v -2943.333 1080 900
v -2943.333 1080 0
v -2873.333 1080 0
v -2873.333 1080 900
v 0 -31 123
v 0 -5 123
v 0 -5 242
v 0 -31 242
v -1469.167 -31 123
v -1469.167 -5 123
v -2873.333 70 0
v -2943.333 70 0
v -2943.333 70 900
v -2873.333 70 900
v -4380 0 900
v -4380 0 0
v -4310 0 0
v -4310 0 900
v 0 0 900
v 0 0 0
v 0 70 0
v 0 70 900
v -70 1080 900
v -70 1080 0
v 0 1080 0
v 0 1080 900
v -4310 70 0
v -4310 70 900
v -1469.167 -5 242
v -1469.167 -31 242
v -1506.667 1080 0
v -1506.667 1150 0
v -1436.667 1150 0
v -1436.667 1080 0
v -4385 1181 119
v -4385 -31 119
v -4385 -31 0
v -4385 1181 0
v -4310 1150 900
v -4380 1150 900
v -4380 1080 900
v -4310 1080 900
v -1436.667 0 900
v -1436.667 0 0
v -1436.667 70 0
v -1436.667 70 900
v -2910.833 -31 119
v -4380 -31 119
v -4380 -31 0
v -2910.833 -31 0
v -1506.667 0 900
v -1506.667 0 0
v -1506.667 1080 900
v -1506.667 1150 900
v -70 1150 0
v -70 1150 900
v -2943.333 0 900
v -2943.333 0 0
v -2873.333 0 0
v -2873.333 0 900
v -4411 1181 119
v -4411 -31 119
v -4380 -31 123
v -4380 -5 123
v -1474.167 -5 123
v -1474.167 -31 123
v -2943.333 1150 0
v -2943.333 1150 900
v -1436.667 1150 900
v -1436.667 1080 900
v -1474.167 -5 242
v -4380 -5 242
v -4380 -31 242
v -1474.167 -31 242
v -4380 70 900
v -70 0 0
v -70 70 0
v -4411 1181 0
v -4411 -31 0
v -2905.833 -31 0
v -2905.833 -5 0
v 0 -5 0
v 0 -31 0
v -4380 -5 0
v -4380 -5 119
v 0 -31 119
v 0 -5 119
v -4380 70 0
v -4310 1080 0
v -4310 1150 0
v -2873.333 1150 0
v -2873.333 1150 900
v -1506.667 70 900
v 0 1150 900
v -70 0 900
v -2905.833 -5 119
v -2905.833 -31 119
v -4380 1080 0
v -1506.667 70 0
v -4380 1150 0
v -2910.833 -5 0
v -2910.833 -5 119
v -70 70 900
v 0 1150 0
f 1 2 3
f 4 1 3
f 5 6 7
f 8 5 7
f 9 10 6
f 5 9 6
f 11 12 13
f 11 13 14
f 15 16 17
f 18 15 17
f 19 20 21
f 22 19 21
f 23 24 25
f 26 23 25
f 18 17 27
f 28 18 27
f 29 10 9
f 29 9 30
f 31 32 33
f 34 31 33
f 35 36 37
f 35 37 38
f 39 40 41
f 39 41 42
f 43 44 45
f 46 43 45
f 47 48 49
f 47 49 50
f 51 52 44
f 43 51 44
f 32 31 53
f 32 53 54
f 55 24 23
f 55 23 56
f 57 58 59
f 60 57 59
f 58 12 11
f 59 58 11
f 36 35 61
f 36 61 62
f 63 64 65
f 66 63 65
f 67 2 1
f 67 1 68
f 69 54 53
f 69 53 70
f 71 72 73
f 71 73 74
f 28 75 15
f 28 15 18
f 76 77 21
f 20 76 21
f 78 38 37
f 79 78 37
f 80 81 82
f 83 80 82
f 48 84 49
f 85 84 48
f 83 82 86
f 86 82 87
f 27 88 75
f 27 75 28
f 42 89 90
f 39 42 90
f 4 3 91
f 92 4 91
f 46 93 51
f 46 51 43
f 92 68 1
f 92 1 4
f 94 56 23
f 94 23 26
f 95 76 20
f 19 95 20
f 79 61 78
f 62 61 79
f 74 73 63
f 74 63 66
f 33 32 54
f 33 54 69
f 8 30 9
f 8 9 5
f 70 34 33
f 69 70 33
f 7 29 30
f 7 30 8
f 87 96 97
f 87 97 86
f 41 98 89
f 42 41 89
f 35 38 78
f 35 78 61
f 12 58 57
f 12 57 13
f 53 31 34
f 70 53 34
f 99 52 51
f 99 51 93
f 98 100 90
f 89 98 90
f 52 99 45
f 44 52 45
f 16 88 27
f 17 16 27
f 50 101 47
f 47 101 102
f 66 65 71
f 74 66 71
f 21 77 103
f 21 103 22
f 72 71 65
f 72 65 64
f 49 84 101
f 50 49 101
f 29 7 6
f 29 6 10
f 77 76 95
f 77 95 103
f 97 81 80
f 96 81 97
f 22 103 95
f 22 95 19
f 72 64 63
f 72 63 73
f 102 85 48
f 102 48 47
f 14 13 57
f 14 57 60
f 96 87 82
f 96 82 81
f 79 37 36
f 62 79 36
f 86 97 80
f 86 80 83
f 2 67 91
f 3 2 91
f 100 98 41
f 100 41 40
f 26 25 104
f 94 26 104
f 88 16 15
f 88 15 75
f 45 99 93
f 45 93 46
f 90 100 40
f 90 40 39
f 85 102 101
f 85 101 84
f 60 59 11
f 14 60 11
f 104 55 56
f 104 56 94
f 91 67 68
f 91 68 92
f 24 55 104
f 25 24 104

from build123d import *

# Parameters (mm, degrees)
F0_W     = 70
F0_H     = 70
F1_DEPTH = 900
F2_W     = 1469.166667
F2_H     = 119
F2_W_2   = 2905.833333
F3_DEPTH = 31
F4_W     = 4912.537255
F4_H     = 1258.728281
F5_DEPTH = 5
F6_W     = 1212
F6_H     = 119
F7_DEPTH = 31
F8_W     = 1212
F8_H     = 119
F9_DEPTH = 5


with BuildPart() as f1:
    # F0 (on Top) → F1 (new body)
    with BuildSketch(Plane.XY):
        with Locations((-2908.333333, 1115)):
            Rectangle(F0_W, F0_H)
        with Locations((-4345, 1115)):
            Rectangle(F0_W, F0_H)
        with Locations((-2908.333333, 35)):
            Rectangle(F0_W, F0_H)
        with Locations((-4345, 35)):
            Rectangle(F0_W, F0_H)
        with Locations((-35, 35)):
            Rectangle(F0_W, F0_H)
        with Locations((-1471.666667, 35)):
            Rectangle(F0_W, F0_H)
        with Locations((-35, 1115)):
            Rectangle(F0_W, F0_H)
        with Locations((-1471.666667, 1115)):
            Rectangle(F0_W, F0_H)
    extrude(amount=F1_DEPTH)


with BuildPart() as f3:
    # F2 (on face) → F3 (new body)
    with BuildSketch(Plane.XZ):
        with Locations((-3645.416667, 59.5)):
            Rectangle(F2_W, F2_H)
        with Locations((-2927.083333, 182.5)):
            Rectangle(F2_W_2, F2_H)
        with Locations((-1452.916667, 59.5)):
            Rectangle(F2_W_2, F2_H)
        with Locations((-734.583333, 182.5)):
            Rectangle(F2_W, F2_H)
    extrude(amount=F3_DEPTH)

    # F4 (on face) → F5 (cut)
    with BuildSketch(Plane(origin=(0, 0, 0), x_dir=(-1, 0, 0), z_dir=(0, 1, 0))):
        with Locations((2362.156074, 383.570425)):
            Rectangle(F4_W, F4_H)
    extrude(amount=-F5_DEPTH, mode=Mode.SUBTRACT)


with BuildPart() as f7:
    # F6 (on face) → F7 (new body)
    with BuildSketch(Plane(origin=(-4380, 0, 0), x_dir=(0, -1, 0), z_dir=(-1, 0, 0))):
        with Locations((-575, 59.5)):
            Rectangle(F6_W, F6_H)
    extrude(amount=F7_DEPTH)

    # F8 (on face) → F9 (cut)
    with BuildSketch(Plane.YZ.offset(-4380)):
        with Locations((575, 59.5)):
            Rectangle(F8_W, F8_H)
    extrude(amount=-F9_DEPTH, mode=Mode.SUBTRACT)


solid = Compound([f1.part, f3.part, f7.part])
